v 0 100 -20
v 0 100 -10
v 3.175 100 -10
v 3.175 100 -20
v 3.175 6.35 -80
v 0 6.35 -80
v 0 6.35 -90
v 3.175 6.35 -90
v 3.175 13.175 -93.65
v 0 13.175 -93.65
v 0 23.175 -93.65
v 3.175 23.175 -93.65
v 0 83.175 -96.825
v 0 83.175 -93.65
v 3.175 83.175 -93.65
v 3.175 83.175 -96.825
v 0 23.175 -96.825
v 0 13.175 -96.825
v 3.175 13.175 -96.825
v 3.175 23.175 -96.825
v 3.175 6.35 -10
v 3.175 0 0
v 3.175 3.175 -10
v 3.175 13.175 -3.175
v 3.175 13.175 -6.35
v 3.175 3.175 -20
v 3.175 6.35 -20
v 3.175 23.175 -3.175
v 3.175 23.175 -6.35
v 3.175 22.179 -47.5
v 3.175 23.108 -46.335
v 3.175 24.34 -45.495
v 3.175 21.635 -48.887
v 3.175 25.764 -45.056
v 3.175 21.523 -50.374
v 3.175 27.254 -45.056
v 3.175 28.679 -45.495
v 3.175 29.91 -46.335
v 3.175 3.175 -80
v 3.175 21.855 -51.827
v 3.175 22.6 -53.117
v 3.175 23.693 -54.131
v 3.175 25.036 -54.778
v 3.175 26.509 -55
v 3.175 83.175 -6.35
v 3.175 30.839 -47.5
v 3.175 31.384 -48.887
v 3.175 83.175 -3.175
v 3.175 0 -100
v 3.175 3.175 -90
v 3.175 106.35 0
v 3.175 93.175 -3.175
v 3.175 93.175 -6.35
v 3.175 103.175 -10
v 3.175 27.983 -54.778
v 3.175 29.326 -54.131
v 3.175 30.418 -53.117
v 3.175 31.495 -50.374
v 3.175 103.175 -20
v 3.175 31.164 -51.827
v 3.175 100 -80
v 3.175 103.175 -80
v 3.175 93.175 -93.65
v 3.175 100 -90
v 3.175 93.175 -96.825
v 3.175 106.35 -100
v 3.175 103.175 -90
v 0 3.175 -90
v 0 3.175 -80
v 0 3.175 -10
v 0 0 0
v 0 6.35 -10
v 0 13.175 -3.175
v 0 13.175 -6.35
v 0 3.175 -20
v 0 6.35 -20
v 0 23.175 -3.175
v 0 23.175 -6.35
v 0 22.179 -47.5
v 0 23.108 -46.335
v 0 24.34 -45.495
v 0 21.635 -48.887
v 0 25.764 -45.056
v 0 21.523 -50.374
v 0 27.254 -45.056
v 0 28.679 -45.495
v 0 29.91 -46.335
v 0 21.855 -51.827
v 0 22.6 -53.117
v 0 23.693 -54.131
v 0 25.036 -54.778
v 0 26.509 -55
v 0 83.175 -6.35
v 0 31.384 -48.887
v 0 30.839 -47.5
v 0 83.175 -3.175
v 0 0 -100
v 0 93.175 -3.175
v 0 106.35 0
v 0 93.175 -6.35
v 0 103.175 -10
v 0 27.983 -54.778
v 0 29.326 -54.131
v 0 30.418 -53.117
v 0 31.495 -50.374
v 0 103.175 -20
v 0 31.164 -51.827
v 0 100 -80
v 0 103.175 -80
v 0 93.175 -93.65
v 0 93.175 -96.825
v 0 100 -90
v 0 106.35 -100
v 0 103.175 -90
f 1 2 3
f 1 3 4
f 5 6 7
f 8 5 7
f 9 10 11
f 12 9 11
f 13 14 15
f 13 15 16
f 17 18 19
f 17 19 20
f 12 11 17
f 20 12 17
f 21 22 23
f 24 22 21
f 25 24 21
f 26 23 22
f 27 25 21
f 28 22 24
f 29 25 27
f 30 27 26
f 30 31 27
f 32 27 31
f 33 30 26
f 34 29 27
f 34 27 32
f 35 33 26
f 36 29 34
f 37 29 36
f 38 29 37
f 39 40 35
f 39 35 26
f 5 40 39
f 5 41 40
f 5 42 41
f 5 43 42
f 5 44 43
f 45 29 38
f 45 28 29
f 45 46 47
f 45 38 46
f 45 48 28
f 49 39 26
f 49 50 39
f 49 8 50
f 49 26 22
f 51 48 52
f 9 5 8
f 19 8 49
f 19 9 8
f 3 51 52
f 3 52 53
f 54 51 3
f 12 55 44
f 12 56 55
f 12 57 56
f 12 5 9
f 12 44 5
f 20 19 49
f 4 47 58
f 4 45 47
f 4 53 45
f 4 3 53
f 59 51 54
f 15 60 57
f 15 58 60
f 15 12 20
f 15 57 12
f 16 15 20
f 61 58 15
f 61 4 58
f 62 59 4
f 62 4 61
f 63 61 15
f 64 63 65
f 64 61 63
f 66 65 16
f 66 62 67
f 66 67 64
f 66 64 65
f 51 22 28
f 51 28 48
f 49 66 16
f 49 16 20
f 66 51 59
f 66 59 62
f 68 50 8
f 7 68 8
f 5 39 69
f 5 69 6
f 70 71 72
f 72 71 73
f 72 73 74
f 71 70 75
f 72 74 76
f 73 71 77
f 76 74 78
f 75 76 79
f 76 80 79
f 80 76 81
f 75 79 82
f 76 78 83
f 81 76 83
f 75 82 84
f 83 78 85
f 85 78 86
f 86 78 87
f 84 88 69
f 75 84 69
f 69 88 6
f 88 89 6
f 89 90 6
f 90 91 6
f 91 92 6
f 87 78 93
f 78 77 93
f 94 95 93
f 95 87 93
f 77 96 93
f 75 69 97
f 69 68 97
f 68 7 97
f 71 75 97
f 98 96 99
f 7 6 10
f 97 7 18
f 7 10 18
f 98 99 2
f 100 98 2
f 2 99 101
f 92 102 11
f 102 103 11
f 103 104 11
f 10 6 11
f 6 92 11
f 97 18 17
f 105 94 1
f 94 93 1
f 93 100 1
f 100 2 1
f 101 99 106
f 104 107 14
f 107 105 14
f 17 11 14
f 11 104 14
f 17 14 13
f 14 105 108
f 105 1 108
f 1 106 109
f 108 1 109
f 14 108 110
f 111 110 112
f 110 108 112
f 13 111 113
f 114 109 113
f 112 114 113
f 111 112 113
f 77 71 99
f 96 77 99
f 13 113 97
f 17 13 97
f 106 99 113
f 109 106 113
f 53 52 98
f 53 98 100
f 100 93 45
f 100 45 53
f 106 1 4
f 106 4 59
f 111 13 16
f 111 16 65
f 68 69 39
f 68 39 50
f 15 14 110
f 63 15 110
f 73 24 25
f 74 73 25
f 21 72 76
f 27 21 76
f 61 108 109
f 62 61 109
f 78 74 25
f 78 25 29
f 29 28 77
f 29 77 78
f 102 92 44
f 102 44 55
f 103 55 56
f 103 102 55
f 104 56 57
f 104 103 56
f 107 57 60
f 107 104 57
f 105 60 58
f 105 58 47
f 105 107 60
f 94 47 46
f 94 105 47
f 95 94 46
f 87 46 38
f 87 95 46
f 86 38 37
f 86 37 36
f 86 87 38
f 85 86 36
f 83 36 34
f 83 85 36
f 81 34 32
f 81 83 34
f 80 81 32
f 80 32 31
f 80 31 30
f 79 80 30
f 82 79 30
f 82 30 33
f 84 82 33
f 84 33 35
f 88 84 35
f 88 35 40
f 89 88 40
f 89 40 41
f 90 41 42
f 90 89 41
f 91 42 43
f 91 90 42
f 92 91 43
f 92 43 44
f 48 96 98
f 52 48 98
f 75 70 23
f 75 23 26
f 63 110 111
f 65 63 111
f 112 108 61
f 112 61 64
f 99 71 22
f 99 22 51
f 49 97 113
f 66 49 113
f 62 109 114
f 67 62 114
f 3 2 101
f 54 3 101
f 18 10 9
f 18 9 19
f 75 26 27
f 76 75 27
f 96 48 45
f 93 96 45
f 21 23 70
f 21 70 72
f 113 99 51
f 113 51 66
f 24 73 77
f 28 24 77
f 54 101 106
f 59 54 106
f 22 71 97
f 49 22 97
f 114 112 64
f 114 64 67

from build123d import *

# Parameters (mm, degrees)
SKETCH1_W           = 100
SKETCH1_H           = 106.35
SKETCH1_R           = 5
SKETCH1_W_2         = 3.175
SKETCH1_H_2         = 10
SKETCH1_W_3         = 10
SKETCH1_H_3         = 3.175
BOSS_EXTRUDE1_DEPTH = 3.175


with BuildPart() as part:
    # Sketch1 → Boss-Extrude1 (new body)
    with BuildSketch(Plane(origin=(0, 0, 0), x_dir=(0, 0, -1), z_dir=(1, 0, 0))):
        with Locations((50, 53.175)):
            Rectangle(SKETCH1_W, SKETCH1_H)
        with Locations((50, 26.509283713)):
            Circle(SKETCH1_R, mode=Mode.SUBTRACT)
        with Locations((4.7625, 88.175)):
            Rectangle(SKETCH1_W_2, SKETCH1_H_2, mode=Mode.SUBTRACT)
        with Locations((15, 101.5875)):
            Rectangle(SKETCH1_W_3, SKETCH1_H_3, mode=Mode.SUBTRACT)
        with Locations((85, 101.5875)):
            Rectangle(SKETCH1_W_3, SKETCH1_H_3, mode=Mode.SUBTRACT)
        with Locations((95.2375, 88.175)):
            Rectangle(SKETCH1_W_2, SKETCH1_H_2, mode=Mode.SUBTRACT)
        with Locations((95.2375, 18.175)):
            Rectangle(SKETCH1_W_2, SKETCH1_H_2, mode=Mode.SUBTRACT)
        with Locations((85, 4.7625)):
            Rectangle(SKETCH1_W_3, SKETCH1_H_3, mode=Mode.SUBTRACT)
        with Locations((15, 4.7625)):
            Rectangle(SKETCH1_W_3, SKETCH1_H_3, mode=Mode.SUBTRACT)
        with Locations((4.7625, 18.175)):
            Rectangle(SKETCH1_W_2, SKETCH1_H_2, mode=Mode.SUBTRACT)
    extrude(amount=BOSS_EXTRUDE1_DEPTH)


solid = part.part
